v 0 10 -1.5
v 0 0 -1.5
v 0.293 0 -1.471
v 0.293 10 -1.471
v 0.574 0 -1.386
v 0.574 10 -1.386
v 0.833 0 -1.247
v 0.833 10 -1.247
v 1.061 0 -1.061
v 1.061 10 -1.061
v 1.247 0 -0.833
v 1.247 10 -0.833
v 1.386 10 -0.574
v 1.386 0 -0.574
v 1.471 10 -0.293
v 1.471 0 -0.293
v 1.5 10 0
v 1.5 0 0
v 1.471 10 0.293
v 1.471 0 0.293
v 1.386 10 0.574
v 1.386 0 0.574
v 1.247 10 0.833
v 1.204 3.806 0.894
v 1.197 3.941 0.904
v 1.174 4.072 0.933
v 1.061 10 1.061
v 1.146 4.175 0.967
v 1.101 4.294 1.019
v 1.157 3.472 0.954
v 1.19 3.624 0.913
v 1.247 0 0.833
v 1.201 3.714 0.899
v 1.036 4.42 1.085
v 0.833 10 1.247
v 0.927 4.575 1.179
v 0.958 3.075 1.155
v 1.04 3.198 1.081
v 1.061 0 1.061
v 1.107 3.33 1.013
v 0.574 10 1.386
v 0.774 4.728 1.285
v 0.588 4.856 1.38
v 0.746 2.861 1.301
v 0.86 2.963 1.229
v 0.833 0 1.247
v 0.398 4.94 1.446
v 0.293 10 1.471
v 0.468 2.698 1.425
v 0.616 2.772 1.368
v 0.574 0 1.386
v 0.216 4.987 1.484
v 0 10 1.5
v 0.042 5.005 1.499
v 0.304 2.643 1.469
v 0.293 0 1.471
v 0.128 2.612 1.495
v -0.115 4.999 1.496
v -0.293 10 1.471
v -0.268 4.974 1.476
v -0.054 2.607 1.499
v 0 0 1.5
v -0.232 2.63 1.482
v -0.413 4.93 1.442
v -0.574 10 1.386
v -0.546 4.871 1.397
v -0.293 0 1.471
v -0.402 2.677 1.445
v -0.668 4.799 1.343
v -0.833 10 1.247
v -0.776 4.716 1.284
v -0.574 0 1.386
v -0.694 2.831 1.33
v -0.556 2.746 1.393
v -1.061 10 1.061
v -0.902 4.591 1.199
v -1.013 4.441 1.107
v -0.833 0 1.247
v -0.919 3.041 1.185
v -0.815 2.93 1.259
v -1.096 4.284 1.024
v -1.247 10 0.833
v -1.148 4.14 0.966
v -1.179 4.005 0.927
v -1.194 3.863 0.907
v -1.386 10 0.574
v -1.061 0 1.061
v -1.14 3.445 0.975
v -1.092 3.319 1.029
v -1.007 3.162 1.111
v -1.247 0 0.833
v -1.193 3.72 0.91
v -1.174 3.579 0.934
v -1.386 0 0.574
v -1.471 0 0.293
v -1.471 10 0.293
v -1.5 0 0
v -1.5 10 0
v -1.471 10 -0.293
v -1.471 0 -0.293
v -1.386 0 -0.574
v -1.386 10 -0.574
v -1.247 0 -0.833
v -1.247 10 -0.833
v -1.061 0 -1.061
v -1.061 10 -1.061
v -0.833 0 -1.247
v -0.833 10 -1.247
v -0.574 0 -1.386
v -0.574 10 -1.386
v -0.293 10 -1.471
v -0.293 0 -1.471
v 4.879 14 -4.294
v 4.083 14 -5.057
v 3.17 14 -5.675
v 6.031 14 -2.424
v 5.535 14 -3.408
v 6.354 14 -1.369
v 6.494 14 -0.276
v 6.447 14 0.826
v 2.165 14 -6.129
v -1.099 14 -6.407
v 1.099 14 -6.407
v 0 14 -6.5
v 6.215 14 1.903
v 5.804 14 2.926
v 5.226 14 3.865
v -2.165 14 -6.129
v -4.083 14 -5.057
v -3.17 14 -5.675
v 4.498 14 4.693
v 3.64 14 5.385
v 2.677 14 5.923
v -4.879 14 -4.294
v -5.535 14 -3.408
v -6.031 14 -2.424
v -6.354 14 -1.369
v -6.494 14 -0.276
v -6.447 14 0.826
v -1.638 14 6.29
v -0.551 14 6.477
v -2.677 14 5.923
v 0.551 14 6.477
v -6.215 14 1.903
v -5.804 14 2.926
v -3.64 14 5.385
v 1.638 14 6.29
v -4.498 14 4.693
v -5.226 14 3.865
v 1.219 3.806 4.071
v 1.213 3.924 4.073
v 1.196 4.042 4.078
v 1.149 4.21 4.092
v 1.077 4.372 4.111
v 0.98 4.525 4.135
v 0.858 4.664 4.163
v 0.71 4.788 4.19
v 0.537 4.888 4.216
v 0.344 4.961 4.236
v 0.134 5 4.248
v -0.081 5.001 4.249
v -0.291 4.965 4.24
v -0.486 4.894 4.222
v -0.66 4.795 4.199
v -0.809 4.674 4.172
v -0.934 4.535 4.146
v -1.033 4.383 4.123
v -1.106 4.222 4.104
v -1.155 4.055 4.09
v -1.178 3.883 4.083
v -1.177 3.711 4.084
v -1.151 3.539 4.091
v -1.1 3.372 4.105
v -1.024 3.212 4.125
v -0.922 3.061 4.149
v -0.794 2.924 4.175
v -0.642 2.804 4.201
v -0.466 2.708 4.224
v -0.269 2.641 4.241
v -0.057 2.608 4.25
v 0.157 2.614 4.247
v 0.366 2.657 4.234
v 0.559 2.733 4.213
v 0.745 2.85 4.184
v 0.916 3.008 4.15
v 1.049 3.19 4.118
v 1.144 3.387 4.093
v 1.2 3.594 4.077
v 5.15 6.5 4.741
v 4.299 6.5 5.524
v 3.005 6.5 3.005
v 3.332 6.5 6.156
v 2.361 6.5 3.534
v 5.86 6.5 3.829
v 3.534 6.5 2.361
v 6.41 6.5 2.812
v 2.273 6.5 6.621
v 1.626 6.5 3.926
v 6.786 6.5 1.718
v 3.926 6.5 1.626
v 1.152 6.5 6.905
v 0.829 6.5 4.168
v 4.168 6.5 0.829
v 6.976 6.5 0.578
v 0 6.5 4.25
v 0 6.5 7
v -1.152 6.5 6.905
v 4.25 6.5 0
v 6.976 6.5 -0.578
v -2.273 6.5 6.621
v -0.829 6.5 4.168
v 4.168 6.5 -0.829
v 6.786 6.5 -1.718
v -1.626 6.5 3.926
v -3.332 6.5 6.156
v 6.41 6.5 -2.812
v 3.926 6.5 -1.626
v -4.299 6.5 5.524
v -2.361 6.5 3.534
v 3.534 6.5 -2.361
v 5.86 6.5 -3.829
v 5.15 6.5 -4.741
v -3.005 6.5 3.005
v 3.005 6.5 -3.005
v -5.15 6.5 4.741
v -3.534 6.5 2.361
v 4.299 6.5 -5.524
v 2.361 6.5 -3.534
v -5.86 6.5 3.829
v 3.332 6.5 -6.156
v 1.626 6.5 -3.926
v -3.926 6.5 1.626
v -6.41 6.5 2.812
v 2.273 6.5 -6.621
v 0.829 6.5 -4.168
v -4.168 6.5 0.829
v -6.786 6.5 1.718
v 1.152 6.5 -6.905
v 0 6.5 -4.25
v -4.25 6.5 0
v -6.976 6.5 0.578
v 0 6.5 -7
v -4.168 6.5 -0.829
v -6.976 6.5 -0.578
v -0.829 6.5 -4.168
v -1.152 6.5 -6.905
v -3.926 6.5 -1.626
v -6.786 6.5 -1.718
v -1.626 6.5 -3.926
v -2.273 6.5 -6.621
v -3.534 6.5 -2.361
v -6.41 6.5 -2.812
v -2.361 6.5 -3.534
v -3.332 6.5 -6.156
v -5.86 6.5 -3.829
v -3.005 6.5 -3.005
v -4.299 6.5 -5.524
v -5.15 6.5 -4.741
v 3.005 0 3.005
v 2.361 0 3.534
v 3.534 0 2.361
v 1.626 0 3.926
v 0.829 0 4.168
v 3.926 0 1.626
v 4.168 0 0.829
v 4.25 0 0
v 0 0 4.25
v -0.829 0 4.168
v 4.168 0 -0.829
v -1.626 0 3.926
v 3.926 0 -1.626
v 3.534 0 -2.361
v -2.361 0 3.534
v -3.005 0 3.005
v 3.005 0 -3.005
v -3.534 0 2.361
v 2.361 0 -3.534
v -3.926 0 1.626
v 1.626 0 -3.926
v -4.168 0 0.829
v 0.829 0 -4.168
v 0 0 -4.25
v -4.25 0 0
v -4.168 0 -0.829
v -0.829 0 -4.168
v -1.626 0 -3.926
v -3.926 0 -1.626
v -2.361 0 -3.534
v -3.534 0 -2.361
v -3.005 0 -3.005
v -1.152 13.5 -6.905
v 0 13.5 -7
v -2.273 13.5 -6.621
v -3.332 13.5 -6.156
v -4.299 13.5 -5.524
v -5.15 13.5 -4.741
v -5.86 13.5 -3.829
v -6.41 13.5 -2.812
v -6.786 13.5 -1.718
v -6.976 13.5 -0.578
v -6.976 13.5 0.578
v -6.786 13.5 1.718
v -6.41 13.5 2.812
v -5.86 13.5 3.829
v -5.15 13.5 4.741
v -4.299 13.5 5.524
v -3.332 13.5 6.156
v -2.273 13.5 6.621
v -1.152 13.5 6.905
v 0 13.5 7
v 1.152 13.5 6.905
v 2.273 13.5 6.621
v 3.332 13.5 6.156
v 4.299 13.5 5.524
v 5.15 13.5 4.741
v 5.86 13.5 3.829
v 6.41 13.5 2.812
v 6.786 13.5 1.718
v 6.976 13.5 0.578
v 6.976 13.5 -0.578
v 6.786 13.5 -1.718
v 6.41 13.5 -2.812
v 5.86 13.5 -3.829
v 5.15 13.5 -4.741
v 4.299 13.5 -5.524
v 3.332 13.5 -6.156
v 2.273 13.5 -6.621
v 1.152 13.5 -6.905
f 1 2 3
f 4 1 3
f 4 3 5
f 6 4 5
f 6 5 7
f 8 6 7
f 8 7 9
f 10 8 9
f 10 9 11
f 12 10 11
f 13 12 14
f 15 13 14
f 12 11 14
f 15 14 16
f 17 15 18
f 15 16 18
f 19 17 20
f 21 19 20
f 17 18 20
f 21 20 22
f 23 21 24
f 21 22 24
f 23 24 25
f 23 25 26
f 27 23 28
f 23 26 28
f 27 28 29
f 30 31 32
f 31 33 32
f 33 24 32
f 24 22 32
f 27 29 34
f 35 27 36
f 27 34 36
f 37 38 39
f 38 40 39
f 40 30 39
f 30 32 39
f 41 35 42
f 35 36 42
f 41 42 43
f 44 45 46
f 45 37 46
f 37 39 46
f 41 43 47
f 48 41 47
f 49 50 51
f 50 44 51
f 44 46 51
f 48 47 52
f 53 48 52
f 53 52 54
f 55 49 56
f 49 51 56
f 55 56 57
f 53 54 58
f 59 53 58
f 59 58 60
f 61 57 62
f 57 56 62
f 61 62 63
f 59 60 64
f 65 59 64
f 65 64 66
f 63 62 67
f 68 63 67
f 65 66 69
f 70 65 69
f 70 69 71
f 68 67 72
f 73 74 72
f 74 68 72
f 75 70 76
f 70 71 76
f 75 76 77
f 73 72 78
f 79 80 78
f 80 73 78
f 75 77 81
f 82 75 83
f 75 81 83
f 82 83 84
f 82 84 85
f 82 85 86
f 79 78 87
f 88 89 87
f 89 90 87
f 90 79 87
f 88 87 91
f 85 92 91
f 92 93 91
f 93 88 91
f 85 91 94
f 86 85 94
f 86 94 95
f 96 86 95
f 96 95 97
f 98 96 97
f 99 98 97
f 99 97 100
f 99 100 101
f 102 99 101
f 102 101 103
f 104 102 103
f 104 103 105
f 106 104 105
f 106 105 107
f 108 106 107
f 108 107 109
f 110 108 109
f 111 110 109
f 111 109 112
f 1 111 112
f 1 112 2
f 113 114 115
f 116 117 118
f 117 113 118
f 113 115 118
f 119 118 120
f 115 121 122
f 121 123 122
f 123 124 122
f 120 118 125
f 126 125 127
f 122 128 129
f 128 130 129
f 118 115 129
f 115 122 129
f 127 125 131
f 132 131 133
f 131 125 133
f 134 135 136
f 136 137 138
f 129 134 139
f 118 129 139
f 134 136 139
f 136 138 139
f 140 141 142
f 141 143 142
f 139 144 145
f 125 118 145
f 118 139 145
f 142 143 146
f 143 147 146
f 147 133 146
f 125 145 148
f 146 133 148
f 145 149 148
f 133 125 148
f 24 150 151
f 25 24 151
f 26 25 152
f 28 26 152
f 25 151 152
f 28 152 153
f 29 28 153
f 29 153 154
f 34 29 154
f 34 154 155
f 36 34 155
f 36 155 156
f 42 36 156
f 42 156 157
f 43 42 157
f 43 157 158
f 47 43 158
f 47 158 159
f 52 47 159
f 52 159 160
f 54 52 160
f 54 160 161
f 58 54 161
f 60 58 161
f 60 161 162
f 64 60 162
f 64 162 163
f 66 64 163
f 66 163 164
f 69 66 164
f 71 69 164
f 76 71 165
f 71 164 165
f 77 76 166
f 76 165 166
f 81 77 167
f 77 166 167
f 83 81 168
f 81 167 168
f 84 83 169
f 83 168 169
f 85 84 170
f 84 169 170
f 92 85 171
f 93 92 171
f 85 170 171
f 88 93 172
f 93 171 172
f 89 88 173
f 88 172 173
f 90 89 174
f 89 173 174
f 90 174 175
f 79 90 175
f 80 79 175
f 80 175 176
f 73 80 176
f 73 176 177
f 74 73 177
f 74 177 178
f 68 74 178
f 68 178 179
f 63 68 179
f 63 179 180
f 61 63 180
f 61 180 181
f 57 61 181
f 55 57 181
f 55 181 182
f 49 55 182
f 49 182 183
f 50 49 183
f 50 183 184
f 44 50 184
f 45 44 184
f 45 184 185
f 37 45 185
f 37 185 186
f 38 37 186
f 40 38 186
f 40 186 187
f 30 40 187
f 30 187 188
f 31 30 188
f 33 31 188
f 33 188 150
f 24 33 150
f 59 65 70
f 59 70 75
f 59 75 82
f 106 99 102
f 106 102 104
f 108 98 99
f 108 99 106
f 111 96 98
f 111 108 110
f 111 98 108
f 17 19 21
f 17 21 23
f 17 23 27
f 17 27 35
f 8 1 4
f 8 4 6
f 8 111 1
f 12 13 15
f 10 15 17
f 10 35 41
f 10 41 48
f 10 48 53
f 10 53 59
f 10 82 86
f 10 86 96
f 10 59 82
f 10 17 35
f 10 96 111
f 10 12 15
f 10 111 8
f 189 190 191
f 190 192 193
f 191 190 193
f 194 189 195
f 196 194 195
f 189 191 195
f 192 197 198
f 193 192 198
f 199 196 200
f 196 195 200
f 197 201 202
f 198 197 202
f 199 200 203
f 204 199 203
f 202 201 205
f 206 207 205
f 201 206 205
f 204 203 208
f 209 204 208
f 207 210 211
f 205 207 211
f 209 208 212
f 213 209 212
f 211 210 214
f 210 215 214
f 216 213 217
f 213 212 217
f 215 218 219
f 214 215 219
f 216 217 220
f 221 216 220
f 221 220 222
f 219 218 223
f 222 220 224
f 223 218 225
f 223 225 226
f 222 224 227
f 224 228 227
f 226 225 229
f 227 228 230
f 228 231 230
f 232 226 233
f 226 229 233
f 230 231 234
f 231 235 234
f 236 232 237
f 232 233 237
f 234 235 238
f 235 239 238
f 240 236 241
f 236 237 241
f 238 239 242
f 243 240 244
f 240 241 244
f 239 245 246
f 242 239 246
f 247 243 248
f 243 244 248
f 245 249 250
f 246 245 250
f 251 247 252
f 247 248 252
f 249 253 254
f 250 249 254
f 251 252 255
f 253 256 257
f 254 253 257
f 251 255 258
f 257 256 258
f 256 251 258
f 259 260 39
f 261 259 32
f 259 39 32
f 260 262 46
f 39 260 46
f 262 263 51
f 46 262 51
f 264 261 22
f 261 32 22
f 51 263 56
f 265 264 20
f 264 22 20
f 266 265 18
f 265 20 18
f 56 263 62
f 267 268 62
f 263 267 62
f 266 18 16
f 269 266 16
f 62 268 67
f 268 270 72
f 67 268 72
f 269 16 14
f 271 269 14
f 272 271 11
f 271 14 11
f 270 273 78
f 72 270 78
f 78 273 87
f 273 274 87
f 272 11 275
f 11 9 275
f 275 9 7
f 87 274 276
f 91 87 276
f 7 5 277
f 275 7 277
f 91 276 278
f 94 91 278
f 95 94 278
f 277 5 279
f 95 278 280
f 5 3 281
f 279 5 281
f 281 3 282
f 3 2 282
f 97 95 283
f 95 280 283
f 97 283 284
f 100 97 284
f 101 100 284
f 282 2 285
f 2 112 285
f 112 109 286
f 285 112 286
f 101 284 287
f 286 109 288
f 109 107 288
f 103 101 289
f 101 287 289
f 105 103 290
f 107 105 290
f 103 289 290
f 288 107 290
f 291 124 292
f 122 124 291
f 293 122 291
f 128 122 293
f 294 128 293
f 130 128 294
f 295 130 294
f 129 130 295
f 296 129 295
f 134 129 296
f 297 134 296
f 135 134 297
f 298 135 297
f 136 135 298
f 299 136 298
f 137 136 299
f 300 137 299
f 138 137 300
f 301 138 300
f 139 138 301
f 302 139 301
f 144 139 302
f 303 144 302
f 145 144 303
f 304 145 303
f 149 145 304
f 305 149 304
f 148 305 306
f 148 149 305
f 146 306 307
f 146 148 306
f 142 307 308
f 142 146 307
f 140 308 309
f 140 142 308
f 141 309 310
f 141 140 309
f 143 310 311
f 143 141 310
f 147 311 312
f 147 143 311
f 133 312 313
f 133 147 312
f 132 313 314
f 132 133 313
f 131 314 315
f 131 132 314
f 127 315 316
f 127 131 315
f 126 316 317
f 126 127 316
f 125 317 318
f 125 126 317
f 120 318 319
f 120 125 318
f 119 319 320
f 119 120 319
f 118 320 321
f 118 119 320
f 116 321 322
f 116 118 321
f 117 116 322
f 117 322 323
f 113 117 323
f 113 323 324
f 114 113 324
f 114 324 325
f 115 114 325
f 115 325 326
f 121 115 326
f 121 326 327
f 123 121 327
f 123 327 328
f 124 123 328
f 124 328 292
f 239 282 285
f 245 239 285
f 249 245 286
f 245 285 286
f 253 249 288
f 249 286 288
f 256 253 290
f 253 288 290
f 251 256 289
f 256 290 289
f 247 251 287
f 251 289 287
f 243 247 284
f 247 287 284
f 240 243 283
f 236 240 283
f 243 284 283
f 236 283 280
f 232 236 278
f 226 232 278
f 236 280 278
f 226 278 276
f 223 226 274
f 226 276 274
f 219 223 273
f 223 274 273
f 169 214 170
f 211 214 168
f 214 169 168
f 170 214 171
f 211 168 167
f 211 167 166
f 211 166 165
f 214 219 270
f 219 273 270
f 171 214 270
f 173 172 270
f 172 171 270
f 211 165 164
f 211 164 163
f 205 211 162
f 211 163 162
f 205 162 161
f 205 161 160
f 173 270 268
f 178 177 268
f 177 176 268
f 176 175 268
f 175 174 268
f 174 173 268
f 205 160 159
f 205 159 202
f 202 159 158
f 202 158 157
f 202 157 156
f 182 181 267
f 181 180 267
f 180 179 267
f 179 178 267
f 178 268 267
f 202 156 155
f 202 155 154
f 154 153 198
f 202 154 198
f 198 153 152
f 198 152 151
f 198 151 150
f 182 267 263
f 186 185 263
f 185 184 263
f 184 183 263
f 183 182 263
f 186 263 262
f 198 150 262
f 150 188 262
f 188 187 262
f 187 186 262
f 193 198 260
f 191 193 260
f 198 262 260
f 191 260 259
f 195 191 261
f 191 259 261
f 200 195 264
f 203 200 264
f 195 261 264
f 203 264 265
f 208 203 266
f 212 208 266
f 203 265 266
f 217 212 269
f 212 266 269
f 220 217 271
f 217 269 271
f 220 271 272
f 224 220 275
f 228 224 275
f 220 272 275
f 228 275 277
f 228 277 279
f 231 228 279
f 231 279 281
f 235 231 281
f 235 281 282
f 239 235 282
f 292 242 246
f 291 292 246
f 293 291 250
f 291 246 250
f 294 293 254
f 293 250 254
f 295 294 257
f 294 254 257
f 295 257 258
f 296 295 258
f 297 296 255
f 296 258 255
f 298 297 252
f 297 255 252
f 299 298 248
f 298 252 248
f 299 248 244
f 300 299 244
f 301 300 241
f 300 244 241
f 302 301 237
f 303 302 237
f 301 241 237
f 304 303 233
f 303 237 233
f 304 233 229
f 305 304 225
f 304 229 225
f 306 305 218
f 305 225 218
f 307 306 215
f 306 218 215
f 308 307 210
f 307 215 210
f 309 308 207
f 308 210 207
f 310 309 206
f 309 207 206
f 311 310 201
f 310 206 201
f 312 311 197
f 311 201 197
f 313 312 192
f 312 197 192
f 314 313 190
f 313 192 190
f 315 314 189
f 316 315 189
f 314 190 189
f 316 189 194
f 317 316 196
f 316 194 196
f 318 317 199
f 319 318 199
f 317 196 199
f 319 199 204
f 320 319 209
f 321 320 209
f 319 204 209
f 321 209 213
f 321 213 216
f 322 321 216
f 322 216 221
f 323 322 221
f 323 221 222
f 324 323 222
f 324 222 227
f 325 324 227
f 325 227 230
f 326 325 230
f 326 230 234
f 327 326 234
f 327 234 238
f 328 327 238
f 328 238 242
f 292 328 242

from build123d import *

# Parameters (mm, degrees)
SMUSSO1_SIZE              = 0.5
SCHIZZO2_R                = 1.5
TAGLIO_ESTRUSIONE1_DEPTH  = 10
FORO_PER_VITE_M2_2_REACH  = 18.726
FORO_PER_VITE_M2_2_BORE_R = 1.2


with BuildPart() as part:
    # Schizzo1 → Rivoluzione1 (revolve)
    with BuildSketch(Plane.XY, mode=Mode.PRIVATE) as rivoluzione1_sk:
        Polygon((-7, 14), (-7, 6.5), (-4.25, 6.5), (-4.25, 0), (0, 0), (0, 14), align=None)
    revolve(rivoluzione1_sk.sketch.rotate(Axis((0, 0, 0), (0, 1, 0)), 270), axis=Axis((0, 0, 0), (0, 1, 0)))

    # Smusso1
    smusso1_edges = [part.edges().sort_by_distance(p)[0] for p in [
        (0, 14, 7),
    ]]
    chamfer(smusso1_edges, length=SMUSSO1_SIZE)

    # Schizzo2 → Taglio-Estrusione1 (cut)
    with BuildSketch(Plane(origin=(0, 0, 0), x_dir=(-1, 0, 0), z_dir=(0, -1, 0))):
        with Locations(Location((0, 0, 0), (0, 0, 90))):
            Circle(SCHIZZO2_R)
    extrude(amount=-TAGLIO_ESTRUSIONE1_DEPTH, mode=Mode.SUBTRACT)

    # Foro per Vite M2-2 bore (on position points) → Foro per Vite M2-2 (cut, up to next)
    with BuildSketch(Plane(origin=(0.020038274, 3.80568373, 4.249952761), x_dir=(0.999988884854, 0, -0.004714888012), z_dir=(0.004714888012, 0, 0.999988884854)), mode=Mode.PRIVATE) as foro_per_vite_m2_2_sk1:
        Circle(FORO_PER_VITE_M2_2_BORE_R)
    foro_per_vite_m2_2_tool1 = extrude(foro_per_vite_m2_2_sk1.sketch, amount=-FORO_PER_VITE_M2_2_REACH, mode=Mode.PRIVATE) & part.part
    add(foro_per_vite_m2_2_tool1.solids().sort_by_distance((0.020038, 3.805684, 4.249953))[0], mode=Mode.SUBTRACT)


solid = part.part
